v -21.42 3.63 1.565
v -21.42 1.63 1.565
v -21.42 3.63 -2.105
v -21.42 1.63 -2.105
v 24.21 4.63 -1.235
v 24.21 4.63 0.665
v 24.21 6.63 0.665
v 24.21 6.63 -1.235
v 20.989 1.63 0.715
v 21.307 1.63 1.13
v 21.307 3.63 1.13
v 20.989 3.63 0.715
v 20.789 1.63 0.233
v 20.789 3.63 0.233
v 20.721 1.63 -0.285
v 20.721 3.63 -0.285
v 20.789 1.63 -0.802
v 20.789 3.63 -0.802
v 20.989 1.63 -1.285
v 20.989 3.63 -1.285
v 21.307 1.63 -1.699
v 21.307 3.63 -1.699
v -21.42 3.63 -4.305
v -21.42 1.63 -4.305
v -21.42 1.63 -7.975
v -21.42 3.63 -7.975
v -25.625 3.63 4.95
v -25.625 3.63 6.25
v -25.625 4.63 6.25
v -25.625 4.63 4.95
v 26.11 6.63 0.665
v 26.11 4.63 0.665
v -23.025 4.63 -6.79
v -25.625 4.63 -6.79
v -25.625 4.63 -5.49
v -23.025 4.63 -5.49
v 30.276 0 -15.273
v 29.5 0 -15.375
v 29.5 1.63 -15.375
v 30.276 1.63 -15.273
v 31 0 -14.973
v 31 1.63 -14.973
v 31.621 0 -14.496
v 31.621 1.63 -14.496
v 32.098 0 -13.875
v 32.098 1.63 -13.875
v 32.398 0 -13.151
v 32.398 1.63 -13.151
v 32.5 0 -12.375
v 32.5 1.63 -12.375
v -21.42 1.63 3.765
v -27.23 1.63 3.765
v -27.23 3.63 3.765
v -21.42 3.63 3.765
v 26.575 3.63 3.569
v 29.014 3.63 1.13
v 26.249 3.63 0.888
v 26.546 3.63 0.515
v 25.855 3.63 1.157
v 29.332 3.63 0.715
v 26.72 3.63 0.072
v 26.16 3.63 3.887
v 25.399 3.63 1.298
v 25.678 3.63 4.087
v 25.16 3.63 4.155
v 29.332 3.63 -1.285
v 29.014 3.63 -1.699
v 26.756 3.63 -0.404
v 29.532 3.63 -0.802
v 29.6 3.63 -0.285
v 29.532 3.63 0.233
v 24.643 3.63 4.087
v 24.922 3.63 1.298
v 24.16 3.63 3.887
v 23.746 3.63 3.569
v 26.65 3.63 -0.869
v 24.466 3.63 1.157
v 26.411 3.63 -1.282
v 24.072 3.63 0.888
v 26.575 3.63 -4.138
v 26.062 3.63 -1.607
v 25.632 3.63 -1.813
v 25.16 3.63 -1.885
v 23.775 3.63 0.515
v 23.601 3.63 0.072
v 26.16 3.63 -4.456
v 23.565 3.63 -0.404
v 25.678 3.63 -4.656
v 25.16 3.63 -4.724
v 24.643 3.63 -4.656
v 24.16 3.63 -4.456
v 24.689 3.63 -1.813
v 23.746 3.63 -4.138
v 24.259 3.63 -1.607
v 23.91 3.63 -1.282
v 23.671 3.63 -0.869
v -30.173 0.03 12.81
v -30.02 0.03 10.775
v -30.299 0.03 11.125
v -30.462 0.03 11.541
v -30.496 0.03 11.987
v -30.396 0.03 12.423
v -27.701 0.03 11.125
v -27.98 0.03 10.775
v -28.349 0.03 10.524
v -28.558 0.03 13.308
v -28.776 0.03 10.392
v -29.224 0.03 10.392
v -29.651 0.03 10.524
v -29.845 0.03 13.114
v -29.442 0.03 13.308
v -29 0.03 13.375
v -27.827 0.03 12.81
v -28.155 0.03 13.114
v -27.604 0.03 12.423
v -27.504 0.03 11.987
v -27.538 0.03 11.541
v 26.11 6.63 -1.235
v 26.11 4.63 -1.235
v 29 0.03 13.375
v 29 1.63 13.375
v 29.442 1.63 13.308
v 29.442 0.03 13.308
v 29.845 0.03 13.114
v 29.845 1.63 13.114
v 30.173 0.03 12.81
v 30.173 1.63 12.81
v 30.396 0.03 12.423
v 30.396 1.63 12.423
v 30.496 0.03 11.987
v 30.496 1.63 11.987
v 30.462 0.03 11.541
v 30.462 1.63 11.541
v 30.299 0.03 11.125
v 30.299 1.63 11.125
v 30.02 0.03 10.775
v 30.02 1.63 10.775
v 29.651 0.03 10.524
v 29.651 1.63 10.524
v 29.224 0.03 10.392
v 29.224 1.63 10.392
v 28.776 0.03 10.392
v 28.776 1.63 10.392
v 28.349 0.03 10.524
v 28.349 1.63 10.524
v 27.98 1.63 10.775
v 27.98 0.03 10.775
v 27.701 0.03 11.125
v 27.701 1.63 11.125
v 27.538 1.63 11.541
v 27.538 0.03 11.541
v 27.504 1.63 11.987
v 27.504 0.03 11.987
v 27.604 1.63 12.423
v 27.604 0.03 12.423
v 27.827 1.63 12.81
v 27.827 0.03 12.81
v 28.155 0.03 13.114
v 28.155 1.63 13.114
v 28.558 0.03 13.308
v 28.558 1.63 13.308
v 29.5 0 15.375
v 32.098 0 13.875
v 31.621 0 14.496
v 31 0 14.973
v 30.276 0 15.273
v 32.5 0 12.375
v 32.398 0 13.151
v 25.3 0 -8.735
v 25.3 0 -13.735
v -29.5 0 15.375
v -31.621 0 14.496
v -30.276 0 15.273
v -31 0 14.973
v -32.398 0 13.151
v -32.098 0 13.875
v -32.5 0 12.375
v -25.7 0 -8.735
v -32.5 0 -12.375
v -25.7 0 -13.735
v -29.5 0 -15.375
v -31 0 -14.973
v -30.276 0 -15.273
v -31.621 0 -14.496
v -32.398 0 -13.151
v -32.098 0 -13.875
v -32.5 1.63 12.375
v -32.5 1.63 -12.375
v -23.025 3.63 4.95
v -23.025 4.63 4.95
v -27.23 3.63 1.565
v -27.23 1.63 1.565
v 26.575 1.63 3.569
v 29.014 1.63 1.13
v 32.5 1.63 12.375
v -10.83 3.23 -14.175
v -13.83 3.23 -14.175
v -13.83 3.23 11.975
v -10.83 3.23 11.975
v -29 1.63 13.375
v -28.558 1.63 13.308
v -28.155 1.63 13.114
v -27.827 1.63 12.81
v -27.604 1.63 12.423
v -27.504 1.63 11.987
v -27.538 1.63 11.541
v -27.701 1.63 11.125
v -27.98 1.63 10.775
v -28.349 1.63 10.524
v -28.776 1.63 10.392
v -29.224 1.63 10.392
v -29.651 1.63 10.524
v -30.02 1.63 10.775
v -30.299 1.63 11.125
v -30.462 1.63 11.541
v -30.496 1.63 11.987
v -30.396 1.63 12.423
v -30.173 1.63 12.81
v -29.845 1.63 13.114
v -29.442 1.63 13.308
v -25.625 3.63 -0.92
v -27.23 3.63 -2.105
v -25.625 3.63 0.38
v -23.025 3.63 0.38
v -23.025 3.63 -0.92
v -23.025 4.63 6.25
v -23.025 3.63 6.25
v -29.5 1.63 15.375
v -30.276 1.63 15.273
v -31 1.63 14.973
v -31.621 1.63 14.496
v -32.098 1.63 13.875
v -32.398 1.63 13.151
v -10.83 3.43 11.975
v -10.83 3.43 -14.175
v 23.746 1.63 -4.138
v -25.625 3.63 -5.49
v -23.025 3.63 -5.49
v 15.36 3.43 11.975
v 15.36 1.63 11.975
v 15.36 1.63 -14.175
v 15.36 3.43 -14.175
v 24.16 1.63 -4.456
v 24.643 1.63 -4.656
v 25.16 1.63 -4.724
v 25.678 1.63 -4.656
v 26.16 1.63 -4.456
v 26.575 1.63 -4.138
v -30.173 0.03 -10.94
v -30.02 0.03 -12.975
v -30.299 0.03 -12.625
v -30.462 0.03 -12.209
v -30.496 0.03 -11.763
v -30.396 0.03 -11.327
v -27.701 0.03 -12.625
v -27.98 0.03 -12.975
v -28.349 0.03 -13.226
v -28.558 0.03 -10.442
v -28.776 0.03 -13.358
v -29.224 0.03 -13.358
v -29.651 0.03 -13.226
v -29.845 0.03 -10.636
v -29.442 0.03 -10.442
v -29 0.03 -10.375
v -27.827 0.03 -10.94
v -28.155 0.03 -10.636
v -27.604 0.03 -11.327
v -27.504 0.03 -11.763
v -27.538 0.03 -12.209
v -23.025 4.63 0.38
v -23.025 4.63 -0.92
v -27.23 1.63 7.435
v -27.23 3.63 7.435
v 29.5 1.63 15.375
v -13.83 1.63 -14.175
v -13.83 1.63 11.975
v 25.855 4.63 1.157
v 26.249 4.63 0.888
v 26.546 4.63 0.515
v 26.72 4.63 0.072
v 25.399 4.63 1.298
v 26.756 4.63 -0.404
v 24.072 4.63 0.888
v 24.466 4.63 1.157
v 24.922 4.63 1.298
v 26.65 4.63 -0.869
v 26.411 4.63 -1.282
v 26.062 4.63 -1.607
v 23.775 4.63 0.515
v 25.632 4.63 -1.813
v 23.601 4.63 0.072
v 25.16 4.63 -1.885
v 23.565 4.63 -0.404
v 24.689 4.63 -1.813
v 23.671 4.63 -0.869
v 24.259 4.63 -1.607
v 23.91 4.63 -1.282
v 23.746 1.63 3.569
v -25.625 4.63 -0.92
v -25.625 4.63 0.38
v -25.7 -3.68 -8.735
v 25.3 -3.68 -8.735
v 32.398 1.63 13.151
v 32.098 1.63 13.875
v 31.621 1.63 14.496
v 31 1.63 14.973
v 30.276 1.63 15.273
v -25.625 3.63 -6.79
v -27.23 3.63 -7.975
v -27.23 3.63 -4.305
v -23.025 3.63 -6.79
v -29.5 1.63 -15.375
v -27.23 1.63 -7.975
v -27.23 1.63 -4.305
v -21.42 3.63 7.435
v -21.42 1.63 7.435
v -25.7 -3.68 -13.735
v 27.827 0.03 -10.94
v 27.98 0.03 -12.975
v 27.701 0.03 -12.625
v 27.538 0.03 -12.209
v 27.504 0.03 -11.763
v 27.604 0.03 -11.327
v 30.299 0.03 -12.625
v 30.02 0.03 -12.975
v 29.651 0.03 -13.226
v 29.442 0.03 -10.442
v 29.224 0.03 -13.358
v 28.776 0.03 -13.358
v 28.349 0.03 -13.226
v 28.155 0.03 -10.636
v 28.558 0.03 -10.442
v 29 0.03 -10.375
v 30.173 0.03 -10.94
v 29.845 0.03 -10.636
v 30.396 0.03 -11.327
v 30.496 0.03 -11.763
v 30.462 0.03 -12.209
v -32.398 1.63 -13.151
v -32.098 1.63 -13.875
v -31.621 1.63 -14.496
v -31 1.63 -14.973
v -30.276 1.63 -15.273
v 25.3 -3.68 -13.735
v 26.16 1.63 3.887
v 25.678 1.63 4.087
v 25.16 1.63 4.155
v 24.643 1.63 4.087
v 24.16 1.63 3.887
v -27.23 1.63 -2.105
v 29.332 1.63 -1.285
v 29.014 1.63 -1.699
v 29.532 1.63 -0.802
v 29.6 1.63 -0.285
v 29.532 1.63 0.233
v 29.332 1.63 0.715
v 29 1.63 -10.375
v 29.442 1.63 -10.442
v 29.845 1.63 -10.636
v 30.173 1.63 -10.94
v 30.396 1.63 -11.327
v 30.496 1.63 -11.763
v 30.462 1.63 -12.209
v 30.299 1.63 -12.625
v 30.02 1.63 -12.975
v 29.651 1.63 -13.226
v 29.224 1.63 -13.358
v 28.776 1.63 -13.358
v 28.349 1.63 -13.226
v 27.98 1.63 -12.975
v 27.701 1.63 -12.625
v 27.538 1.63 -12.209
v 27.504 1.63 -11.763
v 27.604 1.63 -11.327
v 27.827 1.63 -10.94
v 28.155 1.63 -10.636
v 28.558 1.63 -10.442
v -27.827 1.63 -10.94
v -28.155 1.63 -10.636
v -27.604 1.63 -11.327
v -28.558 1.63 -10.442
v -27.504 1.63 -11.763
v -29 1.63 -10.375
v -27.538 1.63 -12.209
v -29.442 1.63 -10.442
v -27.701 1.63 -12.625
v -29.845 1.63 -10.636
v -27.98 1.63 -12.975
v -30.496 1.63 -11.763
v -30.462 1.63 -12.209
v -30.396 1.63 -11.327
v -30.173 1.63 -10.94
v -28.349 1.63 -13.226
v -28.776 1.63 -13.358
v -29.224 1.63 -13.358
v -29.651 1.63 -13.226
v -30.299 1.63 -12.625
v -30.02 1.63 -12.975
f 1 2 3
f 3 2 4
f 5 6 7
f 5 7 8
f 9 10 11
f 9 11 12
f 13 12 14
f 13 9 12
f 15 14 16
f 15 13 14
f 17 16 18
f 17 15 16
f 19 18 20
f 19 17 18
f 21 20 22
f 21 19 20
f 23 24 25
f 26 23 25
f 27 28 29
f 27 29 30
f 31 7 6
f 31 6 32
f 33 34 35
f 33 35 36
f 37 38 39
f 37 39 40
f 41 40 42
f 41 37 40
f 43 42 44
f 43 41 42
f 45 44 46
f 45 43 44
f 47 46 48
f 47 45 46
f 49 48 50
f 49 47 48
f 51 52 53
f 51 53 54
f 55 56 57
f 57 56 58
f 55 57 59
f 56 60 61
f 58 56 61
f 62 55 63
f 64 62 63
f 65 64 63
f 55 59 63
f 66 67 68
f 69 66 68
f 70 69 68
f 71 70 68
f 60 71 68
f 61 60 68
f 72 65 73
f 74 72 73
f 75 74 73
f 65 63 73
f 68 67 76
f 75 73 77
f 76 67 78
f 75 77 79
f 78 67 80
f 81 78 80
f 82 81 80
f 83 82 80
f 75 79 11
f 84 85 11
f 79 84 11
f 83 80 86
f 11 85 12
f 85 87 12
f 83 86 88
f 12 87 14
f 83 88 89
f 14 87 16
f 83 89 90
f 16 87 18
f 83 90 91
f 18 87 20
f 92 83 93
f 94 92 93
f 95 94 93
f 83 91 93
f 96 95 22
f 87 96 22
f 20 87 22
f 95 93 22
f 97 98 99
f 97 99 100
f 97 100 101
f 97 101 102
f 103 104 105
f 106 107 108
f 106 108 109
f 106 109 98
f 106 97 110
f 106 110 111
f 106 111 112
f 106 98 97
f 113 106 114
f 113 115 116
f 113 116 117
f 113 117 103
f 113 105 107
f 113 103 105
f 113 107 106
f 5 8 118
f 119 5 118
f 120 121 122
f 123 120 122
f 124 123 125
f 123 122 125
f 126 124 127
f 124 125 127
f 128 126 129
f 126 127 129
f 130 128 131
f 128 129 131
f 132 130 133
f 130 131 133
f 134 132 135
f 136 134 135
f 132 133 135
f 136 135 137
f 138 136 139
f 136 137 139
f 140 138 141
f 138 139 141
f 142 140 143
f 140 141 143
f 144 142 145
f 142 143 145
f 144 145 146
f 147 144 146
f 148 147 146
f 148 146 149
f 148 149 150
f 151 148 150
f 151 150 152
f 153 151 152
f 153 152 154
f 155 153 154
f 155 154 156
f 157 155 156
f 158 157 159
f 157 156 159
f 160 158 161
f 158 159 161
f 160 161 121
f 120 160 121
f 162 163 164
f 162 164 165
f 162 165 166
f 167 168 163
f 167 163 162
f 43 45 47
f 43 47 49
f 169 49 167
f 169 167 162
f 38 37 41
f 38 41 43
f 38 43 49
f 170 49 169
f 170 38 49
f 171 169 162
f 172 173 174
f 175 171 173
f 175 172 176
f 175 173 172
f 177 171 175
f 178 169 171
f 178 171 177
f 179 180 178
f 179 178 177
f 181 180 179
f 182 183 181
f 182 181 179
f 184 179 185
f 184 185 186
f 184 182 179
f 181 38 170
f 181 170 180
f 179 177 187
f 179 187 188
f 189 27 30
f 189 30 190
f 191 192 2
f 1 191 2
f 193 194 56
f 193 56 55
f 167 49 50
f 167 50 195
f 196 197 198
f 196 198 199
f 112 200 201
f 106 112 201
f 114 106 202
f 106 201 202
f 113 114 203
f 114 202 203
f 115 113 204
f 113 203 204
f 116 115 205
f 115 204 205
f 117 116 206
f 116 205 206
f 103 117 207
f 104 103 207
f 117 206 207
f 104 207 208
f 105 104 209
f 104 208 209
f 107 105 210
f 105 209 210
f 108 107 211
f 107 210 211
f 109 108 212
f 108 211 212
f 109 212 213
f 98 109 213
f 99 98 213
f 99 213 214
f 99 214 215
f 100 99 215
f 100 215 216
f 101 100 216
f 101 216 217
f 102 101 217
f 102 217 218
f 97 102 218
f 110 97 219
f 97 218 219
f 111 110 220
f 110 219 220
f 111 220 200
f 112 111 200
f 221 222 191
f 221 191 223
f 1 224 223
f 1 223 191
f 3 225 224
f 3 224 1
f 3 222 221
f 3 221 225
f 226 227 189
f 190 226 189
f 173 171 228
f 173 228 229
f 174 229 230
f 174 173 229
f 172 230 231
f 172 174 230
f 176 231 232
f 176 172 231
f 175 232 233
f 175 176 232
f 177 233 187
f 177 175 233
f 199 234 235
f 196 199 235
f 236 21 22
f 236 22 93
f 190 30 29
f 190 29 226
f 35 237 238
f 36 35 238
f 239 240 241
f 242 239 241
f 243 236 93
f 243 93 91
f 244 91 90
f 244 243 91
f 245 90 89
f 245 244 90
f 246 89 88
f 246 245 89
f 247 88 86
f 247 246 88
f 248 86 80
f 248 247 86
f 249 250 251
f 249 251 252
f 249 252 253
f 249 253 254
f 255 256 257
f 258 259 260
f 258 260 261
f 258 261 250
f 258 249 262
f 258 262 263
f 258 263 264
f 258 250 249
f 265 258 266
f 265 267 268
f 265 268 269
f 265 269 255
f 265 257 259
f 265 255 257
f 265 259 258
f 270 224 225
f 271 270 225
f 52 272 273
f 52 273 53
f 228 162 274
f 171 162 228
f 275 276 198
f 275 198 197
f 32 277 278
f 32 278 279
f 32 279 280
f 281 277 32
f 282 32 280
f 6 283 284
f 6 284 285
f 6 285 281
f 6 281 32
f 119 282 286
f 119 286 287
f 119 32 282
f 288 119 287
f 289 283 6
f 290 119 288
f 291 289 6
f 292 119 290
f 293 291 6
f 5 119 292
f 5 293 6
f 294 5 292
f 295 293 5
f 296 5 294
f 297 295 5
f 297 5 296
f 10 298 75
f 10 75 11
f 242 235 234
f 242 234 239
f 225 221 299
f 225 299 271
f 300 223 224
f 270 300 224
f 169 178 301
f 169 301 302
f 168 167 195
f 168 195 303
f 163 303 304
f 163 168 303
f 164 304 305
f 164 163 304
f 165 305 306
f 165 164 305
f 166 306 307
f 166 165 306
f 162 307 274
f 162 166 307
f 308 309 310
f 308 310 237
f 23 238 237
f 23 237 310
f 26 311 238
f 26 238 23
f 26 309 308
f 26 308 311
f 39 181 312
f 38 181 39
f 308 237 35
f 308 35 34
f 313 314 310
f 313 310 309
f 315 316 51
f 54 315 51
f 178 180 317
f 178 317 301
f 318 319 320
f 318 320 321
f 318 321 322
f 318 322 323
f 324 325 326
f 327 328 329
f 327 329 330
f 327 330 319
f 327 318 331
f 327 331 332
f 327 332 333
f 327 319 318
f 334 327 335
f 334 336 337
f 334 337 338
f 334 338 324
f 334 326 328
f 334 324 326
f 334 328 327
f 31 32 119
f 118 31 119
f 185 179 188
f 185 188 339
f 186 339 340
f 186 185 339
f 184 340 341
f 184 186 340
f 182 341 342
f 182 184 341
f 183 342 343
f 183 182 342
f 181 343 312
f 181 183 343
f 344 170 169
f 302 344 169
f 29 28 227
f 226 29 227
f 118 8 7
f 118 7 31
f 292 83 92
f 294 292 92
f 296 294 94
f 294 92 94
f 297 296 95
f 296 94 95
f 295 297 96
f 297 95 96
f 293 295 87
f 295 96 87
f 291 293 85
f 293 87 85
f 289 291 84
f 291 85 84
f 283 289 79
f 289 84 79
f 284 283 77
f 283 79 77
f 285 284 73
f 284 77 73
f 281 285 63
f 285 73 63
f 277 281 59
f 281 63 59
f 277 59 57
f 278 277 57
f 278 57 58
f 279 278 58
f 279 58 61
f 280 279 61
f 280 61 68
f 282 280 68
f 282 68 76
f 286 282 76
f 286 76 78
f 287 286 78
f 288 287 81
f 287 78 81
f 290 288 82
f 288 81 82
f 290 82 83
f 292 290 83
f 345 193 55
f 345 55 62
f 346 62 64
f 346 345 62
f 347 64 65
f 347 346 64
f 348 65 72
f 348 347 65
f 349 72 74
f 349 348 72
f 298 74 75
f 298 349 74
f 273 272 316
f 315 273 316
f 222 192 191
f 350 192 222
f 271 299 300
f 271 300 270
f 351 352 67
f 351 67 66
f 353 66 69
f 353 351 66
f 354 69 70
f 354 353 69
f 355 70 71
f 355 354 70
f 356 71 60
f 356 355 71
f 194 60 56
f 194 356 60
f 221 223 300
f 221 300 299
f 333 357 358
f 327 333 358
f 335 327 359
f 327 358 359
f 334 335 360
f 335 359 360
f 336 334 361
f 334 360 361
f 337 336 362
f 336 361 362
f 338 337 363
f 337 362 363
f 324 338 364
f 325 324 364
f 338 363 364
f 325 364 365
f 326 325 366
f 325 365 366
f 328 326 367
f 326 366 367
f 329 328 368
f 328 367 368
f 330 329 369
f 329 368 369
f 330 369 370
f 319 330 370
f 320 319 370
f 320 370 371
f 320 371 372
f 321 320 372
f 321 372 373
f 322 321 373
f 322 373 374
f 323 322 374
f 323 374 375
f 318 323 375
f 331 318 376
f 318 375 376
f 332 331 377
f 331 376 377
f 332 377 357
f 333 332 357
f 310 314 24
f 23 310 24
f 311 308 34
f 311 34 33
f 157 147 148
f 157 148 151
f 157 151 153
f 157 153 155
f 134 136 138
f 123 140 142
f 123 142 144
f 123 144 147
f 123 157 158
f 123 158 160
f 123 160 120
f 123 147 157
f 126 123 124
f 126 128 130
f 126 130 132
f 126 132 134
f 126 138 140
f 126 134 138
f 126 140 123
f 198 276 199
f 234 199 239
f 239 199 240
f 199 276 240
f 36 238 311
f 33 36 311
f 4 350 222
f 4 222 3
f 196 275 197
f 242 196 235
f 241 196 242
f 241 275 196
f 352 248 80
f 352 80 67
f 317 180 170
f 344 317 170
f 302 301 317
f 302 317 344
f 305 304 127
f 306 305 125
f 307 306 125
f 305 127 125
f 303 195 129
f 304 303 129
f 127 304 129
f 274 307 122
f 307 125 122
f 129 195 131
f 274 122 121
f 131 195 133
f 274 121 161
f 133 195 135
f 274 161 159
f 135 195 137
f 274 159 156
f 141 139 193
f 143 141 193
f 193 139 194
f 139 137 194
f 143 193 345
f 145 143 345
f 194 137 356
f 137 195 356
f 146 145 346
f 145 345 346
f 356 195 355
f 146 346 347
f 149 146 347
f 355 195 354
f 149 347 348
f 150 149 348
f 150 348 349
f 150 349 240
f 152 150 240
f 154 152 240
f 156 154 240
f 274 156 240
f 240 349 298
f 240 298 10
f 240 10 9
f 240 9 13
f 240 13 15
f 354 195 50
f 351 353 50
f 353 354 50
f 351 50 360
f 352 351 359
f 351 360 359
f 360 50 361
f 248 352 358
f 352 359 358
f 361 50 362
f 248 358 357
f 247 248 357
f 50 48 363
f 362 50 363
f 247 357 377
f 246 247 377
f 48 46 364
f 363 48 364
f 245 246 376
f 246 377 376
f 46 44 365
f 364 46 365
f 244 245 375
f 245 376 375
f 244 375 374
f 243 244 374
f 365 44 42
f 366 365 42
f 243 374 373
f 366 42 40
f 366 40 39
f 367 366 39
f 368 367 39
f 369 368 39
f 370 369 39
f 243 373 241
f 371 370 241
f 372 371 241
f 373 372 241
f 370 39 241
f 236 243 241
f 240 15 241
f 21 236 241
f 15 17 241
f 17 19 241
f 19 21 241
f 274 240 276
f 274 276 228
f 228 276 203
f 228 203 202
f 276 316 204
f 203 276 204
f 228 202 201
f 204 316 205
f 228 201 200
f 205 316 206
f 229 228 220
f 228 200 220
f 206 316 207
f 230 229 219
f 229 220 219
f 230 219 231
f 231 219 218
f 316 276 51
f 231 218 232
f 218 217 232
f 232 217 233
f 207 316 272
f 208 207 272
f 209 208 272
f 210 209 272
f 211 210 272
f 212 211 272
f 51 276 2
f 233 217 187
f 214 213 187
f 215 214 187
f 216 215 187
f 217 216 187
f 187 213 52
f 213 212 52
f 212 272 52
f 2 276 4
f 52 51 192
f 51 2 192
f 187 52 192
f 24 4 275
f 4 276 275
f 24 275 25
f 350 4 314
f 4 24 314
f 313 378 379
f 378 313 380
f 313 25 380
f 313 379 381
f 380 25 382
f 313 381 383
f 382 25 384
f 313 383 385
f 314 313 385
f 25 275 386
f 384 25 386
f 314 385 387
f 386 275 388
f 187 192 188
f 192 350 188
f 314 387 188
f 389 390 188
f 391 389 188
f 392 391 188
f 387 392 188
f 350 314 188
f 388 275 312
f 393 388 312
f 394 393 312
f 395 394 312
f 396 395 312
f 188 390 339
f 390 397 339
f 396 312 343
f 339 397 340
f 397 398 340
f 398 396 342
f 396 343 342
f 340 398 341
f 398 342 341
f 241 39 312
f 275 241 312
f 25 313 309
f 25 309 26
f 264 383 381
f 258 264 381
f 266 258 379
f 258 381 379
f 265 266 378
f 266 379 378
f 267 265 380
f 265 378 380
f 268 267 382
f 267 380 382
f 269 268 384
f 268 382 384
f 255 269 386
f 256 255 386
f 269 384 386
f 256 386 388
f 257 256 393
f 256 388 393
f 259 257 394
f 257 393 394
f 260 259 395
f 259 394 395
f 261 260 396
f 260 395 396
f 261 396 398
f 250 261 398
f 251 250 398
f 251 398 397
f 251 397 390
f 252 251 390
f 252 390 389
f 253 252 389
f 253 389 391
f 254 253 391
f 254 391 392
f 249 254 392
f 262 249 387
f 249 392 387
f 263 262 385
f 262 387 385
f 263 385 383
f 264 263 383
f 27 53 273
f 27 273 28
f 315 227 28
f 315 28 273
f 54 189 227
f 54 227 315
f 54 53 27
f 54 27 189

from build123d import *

# Parameters (mm, degrees)
EXTRUDE_1_DEPTH     = 1.63
SKETCH_2_R          = 1.5
CUT_EXTRUDE_1_DEPTH = 1.6
SKETCH_3_W          = 29.19
SKETCH_3_H          = 26.15
EXTRUDE_2_DEPTH     = 1.8
EXTRUDE_3_DEPTH     = 2
SKETCH_6_W          = 3
SKETCH_6_H          = 26.15
CUT_EXTRUDE_2_DEPTH = 0.2
SKETCH_4_W          = 5.81
SKETCH_4_H          = 3.67
EXTRUDE_4_DEPTH     = 2
SKETCH_7_W          = 2.6
SKETCH_7_H          = 1.3
EXTRUDE_5_DEPTH     = 1
SKETCH_8_W          = 51
SKETCH_8_H          = 5
EXTRUDE_6_DEPTH     = 3.68
SKETCH_9_W          = 1.9
SKETCH_9_H          = 1.9
EXTRUDE_7_DEPTH     = 3
SKETCH_10_R         = 1.6
EXTRUDE_8_DEPTH     = 1


with BuildPart() as part:
    # 草图1 → 凸台-拉伸1 (new body)
    with BuildSketch(Plane(origin=(0, 0, 0), x_dir=(1, 0, 0), z_dir=(0, 1, 0))):
        with BuildLine():
            Line((-29.5, 15.375), (29.5, 15.375))
            ThreePointArc((29.5, 15.375), (31.621320344, 14.496320344), (32.5, 12.375))
            Line((32.5, 12.375), (32.5, -12.375))
            ThreePointArc((32.5, -12.375), (31.621320344, -14.496320344), (29.5, -15.375))
            Line((29.5, -15.375), (-29.5, -15.375))
            ThreePointArc((-29.5, -15.375), (-31.621320344, -14.496320344), (-32.5, -12.375))
            Line((-32.5, -12.375), (-32.5, 12.375))
            ThreePointArc((-32.5, 12.375), (-31.621320344, 14.496320344), (-29.5, 15.375))
        make_face()
    extrude(amount=EXTRUDE_1_DEPTH)

    # 草图2 → 切除-拉伸1 (cut)
    with BuildSketch(Plane(origin=(0, 1.63, 0), x_dir=(1, 0, 0), z_dir=(0, 1, 0))):
        with Locations(Location((-29, 11.875, 0), (0, 0, 270))):
            Circle(SKETCH_2_R)
        with Locations(Location((-29, -11.875, 0), (0, 0, 270))):
            Circle(SKETCH_2_R)
        with Locations(Location((29, -11.875, 0), (0, 0, 270))):
            Circle(SKETCH_2_R)
        with Locations(Location((29, 11.875, 0), (0, 0, 270))):
            Circle(SKETCH_2_R)
    extrude(amount=-CUT_EXTRUDE_1_DEPTH, mode=Mode.SUBTRACT)

    # 草图3 → 凸台-拉伸2 (add)
    with BuildSketch(Plane(origin=(0, 1.63, 0), x_dir=(1, 0, 0), z_dir=(0, 1, 0))):
        with Locations((0.765, 1.1)):
            Rectangle(SKETCH_3_W, SKETCH_3_H)
    extrude(amount=EXTRUDE_2_DEPTH)

    # 草图5 → 凸台-拉伸3 (add)
    with BuildSketch(Plane(origin=(0, 1.63, 0), x_dir=(1, 0, 0), z_dir=(0, 1, 0))):
        with BuildLine():
            Line((26.574695167, 4.138250353), (29.014213562, 1.698731957))
            ThreePointArc((29.014213562, 1.698731957), (29.6, 0.284518395), (29.014213562, -1.129695167))
            Line((29.014213562, -1.129695167), (26.574695167, -3.569213562))
            ThreePointArc((26.574695167, -3.569213562), (25.160481605, -4.155), (23.746268043, -3.569213562))
            Line((23.746268043, -3.569213562), (21.306749647, -1.129695167))
            ThreePointArc((21.306749647, -1.129695167), (20.72096321, 0.284518395), (21.306749647, 1.698731957))
            Line((21.306749647, 1.698731957), (23.746268043, 4.138250353))
            ThreePointArc((23.746268043, 4.138250353), (25.160481605, 4.72403679), (26.574695167, 4.138250353))
        make_face()
    extrude(amount=EXTRUDE_3_DEPTH)

    # 草图6 → 切除-拉伸2 (cut)
    with BuildSketch(Plane(origin=(0, 3.43, 0), x_dir=(1, 0, 0), z_dir=(0, 1, 0))):
        with Locations((-12.33, 1.1)):
            Rectangle(SKETCH_6_W, SKETCH_6_H)
    extrude(amount=-CUT_EXTRUDE_2_DEPTH, mode=Mode.SUBTRACT)

    # 草图4 → 凸台-拉伸4 (add)
    with BuildSketch(Plane(origin=(0, 1.63, 0), x_dir=(1, 0, 0), z_dir=(0, 1, 0))):
        with Locations((-24.325, 6.14)):
            Rectangle(SKETCH_4_W, SKETCH_4_H)
        with Locations((-24.325, 0.27)):
            Rectangle(SKETCH_4_W, SKETCH_4_H)
        with Locations((-24.325, -5.6)):
            Rectangle(SKETCH_4_W, SKETCH_4_H)
    extrude(amount=EXTRUDE_4_DEPTH)

    # 草图7 → 凸台-拉伸5 (add)
    with BuildSketch(Plane(origin=(0, 3.63, 0), x_dir=(1, 0, 0), z_dir=(0, 1, 0))):
        with Locations((-24.325, 6.14)):
            Rectangle(SKETCH_7_W, SKETCH_7_H)
        with Locations((-24.325, 0.27)):
            Rectangle(SKETCH_7_W, SKETCH_7_H)
        with Locations((-24.325, -5.6)):
            Rectangle(SKETCH_7_W, SKETCH_7_H)
    extrude(amount=EXTRUDE_5_DEPTH)

    # 草图8 → 凸台-拉伸6 (add)
    with BuildSketch(Plane.XZ):
        with Locations((-0.2, -11.235)):
            Rectangle(SKETCH_8_W, SKETCH_8_H)
    extrude(amount=EXTRUDE_6_DEPTH)

    # 草图9 → 凸台-拉伸7 (add)
    with BuildSketch(Plane(origin=(0, 3.63, 0), x_dir=(1, 0, 0), z_dir=(0, 1, 0))):
        with Locations((25.160481605, 0.284518395)):
            Rectangle(SKETCH_9_W, SKETCH_9_H)
    extrude(amount=EXTRUDE_7_DEPTH)

    # 草图10 → 凸台-拉伸8 (add)
    with BuildSketch(Plane(origin=(0, 3.63, 0), x_dir=(1, 0, 0), z_dir=(0, 1, 0))):
        with Locations(Location((25.160481605, 0.284518395, 0), (0, 0, 90))):
            Circle(SKETCH_10_R)
    extrude(amount=EXTRUDE_8_DEPTH)


solid = part.part
